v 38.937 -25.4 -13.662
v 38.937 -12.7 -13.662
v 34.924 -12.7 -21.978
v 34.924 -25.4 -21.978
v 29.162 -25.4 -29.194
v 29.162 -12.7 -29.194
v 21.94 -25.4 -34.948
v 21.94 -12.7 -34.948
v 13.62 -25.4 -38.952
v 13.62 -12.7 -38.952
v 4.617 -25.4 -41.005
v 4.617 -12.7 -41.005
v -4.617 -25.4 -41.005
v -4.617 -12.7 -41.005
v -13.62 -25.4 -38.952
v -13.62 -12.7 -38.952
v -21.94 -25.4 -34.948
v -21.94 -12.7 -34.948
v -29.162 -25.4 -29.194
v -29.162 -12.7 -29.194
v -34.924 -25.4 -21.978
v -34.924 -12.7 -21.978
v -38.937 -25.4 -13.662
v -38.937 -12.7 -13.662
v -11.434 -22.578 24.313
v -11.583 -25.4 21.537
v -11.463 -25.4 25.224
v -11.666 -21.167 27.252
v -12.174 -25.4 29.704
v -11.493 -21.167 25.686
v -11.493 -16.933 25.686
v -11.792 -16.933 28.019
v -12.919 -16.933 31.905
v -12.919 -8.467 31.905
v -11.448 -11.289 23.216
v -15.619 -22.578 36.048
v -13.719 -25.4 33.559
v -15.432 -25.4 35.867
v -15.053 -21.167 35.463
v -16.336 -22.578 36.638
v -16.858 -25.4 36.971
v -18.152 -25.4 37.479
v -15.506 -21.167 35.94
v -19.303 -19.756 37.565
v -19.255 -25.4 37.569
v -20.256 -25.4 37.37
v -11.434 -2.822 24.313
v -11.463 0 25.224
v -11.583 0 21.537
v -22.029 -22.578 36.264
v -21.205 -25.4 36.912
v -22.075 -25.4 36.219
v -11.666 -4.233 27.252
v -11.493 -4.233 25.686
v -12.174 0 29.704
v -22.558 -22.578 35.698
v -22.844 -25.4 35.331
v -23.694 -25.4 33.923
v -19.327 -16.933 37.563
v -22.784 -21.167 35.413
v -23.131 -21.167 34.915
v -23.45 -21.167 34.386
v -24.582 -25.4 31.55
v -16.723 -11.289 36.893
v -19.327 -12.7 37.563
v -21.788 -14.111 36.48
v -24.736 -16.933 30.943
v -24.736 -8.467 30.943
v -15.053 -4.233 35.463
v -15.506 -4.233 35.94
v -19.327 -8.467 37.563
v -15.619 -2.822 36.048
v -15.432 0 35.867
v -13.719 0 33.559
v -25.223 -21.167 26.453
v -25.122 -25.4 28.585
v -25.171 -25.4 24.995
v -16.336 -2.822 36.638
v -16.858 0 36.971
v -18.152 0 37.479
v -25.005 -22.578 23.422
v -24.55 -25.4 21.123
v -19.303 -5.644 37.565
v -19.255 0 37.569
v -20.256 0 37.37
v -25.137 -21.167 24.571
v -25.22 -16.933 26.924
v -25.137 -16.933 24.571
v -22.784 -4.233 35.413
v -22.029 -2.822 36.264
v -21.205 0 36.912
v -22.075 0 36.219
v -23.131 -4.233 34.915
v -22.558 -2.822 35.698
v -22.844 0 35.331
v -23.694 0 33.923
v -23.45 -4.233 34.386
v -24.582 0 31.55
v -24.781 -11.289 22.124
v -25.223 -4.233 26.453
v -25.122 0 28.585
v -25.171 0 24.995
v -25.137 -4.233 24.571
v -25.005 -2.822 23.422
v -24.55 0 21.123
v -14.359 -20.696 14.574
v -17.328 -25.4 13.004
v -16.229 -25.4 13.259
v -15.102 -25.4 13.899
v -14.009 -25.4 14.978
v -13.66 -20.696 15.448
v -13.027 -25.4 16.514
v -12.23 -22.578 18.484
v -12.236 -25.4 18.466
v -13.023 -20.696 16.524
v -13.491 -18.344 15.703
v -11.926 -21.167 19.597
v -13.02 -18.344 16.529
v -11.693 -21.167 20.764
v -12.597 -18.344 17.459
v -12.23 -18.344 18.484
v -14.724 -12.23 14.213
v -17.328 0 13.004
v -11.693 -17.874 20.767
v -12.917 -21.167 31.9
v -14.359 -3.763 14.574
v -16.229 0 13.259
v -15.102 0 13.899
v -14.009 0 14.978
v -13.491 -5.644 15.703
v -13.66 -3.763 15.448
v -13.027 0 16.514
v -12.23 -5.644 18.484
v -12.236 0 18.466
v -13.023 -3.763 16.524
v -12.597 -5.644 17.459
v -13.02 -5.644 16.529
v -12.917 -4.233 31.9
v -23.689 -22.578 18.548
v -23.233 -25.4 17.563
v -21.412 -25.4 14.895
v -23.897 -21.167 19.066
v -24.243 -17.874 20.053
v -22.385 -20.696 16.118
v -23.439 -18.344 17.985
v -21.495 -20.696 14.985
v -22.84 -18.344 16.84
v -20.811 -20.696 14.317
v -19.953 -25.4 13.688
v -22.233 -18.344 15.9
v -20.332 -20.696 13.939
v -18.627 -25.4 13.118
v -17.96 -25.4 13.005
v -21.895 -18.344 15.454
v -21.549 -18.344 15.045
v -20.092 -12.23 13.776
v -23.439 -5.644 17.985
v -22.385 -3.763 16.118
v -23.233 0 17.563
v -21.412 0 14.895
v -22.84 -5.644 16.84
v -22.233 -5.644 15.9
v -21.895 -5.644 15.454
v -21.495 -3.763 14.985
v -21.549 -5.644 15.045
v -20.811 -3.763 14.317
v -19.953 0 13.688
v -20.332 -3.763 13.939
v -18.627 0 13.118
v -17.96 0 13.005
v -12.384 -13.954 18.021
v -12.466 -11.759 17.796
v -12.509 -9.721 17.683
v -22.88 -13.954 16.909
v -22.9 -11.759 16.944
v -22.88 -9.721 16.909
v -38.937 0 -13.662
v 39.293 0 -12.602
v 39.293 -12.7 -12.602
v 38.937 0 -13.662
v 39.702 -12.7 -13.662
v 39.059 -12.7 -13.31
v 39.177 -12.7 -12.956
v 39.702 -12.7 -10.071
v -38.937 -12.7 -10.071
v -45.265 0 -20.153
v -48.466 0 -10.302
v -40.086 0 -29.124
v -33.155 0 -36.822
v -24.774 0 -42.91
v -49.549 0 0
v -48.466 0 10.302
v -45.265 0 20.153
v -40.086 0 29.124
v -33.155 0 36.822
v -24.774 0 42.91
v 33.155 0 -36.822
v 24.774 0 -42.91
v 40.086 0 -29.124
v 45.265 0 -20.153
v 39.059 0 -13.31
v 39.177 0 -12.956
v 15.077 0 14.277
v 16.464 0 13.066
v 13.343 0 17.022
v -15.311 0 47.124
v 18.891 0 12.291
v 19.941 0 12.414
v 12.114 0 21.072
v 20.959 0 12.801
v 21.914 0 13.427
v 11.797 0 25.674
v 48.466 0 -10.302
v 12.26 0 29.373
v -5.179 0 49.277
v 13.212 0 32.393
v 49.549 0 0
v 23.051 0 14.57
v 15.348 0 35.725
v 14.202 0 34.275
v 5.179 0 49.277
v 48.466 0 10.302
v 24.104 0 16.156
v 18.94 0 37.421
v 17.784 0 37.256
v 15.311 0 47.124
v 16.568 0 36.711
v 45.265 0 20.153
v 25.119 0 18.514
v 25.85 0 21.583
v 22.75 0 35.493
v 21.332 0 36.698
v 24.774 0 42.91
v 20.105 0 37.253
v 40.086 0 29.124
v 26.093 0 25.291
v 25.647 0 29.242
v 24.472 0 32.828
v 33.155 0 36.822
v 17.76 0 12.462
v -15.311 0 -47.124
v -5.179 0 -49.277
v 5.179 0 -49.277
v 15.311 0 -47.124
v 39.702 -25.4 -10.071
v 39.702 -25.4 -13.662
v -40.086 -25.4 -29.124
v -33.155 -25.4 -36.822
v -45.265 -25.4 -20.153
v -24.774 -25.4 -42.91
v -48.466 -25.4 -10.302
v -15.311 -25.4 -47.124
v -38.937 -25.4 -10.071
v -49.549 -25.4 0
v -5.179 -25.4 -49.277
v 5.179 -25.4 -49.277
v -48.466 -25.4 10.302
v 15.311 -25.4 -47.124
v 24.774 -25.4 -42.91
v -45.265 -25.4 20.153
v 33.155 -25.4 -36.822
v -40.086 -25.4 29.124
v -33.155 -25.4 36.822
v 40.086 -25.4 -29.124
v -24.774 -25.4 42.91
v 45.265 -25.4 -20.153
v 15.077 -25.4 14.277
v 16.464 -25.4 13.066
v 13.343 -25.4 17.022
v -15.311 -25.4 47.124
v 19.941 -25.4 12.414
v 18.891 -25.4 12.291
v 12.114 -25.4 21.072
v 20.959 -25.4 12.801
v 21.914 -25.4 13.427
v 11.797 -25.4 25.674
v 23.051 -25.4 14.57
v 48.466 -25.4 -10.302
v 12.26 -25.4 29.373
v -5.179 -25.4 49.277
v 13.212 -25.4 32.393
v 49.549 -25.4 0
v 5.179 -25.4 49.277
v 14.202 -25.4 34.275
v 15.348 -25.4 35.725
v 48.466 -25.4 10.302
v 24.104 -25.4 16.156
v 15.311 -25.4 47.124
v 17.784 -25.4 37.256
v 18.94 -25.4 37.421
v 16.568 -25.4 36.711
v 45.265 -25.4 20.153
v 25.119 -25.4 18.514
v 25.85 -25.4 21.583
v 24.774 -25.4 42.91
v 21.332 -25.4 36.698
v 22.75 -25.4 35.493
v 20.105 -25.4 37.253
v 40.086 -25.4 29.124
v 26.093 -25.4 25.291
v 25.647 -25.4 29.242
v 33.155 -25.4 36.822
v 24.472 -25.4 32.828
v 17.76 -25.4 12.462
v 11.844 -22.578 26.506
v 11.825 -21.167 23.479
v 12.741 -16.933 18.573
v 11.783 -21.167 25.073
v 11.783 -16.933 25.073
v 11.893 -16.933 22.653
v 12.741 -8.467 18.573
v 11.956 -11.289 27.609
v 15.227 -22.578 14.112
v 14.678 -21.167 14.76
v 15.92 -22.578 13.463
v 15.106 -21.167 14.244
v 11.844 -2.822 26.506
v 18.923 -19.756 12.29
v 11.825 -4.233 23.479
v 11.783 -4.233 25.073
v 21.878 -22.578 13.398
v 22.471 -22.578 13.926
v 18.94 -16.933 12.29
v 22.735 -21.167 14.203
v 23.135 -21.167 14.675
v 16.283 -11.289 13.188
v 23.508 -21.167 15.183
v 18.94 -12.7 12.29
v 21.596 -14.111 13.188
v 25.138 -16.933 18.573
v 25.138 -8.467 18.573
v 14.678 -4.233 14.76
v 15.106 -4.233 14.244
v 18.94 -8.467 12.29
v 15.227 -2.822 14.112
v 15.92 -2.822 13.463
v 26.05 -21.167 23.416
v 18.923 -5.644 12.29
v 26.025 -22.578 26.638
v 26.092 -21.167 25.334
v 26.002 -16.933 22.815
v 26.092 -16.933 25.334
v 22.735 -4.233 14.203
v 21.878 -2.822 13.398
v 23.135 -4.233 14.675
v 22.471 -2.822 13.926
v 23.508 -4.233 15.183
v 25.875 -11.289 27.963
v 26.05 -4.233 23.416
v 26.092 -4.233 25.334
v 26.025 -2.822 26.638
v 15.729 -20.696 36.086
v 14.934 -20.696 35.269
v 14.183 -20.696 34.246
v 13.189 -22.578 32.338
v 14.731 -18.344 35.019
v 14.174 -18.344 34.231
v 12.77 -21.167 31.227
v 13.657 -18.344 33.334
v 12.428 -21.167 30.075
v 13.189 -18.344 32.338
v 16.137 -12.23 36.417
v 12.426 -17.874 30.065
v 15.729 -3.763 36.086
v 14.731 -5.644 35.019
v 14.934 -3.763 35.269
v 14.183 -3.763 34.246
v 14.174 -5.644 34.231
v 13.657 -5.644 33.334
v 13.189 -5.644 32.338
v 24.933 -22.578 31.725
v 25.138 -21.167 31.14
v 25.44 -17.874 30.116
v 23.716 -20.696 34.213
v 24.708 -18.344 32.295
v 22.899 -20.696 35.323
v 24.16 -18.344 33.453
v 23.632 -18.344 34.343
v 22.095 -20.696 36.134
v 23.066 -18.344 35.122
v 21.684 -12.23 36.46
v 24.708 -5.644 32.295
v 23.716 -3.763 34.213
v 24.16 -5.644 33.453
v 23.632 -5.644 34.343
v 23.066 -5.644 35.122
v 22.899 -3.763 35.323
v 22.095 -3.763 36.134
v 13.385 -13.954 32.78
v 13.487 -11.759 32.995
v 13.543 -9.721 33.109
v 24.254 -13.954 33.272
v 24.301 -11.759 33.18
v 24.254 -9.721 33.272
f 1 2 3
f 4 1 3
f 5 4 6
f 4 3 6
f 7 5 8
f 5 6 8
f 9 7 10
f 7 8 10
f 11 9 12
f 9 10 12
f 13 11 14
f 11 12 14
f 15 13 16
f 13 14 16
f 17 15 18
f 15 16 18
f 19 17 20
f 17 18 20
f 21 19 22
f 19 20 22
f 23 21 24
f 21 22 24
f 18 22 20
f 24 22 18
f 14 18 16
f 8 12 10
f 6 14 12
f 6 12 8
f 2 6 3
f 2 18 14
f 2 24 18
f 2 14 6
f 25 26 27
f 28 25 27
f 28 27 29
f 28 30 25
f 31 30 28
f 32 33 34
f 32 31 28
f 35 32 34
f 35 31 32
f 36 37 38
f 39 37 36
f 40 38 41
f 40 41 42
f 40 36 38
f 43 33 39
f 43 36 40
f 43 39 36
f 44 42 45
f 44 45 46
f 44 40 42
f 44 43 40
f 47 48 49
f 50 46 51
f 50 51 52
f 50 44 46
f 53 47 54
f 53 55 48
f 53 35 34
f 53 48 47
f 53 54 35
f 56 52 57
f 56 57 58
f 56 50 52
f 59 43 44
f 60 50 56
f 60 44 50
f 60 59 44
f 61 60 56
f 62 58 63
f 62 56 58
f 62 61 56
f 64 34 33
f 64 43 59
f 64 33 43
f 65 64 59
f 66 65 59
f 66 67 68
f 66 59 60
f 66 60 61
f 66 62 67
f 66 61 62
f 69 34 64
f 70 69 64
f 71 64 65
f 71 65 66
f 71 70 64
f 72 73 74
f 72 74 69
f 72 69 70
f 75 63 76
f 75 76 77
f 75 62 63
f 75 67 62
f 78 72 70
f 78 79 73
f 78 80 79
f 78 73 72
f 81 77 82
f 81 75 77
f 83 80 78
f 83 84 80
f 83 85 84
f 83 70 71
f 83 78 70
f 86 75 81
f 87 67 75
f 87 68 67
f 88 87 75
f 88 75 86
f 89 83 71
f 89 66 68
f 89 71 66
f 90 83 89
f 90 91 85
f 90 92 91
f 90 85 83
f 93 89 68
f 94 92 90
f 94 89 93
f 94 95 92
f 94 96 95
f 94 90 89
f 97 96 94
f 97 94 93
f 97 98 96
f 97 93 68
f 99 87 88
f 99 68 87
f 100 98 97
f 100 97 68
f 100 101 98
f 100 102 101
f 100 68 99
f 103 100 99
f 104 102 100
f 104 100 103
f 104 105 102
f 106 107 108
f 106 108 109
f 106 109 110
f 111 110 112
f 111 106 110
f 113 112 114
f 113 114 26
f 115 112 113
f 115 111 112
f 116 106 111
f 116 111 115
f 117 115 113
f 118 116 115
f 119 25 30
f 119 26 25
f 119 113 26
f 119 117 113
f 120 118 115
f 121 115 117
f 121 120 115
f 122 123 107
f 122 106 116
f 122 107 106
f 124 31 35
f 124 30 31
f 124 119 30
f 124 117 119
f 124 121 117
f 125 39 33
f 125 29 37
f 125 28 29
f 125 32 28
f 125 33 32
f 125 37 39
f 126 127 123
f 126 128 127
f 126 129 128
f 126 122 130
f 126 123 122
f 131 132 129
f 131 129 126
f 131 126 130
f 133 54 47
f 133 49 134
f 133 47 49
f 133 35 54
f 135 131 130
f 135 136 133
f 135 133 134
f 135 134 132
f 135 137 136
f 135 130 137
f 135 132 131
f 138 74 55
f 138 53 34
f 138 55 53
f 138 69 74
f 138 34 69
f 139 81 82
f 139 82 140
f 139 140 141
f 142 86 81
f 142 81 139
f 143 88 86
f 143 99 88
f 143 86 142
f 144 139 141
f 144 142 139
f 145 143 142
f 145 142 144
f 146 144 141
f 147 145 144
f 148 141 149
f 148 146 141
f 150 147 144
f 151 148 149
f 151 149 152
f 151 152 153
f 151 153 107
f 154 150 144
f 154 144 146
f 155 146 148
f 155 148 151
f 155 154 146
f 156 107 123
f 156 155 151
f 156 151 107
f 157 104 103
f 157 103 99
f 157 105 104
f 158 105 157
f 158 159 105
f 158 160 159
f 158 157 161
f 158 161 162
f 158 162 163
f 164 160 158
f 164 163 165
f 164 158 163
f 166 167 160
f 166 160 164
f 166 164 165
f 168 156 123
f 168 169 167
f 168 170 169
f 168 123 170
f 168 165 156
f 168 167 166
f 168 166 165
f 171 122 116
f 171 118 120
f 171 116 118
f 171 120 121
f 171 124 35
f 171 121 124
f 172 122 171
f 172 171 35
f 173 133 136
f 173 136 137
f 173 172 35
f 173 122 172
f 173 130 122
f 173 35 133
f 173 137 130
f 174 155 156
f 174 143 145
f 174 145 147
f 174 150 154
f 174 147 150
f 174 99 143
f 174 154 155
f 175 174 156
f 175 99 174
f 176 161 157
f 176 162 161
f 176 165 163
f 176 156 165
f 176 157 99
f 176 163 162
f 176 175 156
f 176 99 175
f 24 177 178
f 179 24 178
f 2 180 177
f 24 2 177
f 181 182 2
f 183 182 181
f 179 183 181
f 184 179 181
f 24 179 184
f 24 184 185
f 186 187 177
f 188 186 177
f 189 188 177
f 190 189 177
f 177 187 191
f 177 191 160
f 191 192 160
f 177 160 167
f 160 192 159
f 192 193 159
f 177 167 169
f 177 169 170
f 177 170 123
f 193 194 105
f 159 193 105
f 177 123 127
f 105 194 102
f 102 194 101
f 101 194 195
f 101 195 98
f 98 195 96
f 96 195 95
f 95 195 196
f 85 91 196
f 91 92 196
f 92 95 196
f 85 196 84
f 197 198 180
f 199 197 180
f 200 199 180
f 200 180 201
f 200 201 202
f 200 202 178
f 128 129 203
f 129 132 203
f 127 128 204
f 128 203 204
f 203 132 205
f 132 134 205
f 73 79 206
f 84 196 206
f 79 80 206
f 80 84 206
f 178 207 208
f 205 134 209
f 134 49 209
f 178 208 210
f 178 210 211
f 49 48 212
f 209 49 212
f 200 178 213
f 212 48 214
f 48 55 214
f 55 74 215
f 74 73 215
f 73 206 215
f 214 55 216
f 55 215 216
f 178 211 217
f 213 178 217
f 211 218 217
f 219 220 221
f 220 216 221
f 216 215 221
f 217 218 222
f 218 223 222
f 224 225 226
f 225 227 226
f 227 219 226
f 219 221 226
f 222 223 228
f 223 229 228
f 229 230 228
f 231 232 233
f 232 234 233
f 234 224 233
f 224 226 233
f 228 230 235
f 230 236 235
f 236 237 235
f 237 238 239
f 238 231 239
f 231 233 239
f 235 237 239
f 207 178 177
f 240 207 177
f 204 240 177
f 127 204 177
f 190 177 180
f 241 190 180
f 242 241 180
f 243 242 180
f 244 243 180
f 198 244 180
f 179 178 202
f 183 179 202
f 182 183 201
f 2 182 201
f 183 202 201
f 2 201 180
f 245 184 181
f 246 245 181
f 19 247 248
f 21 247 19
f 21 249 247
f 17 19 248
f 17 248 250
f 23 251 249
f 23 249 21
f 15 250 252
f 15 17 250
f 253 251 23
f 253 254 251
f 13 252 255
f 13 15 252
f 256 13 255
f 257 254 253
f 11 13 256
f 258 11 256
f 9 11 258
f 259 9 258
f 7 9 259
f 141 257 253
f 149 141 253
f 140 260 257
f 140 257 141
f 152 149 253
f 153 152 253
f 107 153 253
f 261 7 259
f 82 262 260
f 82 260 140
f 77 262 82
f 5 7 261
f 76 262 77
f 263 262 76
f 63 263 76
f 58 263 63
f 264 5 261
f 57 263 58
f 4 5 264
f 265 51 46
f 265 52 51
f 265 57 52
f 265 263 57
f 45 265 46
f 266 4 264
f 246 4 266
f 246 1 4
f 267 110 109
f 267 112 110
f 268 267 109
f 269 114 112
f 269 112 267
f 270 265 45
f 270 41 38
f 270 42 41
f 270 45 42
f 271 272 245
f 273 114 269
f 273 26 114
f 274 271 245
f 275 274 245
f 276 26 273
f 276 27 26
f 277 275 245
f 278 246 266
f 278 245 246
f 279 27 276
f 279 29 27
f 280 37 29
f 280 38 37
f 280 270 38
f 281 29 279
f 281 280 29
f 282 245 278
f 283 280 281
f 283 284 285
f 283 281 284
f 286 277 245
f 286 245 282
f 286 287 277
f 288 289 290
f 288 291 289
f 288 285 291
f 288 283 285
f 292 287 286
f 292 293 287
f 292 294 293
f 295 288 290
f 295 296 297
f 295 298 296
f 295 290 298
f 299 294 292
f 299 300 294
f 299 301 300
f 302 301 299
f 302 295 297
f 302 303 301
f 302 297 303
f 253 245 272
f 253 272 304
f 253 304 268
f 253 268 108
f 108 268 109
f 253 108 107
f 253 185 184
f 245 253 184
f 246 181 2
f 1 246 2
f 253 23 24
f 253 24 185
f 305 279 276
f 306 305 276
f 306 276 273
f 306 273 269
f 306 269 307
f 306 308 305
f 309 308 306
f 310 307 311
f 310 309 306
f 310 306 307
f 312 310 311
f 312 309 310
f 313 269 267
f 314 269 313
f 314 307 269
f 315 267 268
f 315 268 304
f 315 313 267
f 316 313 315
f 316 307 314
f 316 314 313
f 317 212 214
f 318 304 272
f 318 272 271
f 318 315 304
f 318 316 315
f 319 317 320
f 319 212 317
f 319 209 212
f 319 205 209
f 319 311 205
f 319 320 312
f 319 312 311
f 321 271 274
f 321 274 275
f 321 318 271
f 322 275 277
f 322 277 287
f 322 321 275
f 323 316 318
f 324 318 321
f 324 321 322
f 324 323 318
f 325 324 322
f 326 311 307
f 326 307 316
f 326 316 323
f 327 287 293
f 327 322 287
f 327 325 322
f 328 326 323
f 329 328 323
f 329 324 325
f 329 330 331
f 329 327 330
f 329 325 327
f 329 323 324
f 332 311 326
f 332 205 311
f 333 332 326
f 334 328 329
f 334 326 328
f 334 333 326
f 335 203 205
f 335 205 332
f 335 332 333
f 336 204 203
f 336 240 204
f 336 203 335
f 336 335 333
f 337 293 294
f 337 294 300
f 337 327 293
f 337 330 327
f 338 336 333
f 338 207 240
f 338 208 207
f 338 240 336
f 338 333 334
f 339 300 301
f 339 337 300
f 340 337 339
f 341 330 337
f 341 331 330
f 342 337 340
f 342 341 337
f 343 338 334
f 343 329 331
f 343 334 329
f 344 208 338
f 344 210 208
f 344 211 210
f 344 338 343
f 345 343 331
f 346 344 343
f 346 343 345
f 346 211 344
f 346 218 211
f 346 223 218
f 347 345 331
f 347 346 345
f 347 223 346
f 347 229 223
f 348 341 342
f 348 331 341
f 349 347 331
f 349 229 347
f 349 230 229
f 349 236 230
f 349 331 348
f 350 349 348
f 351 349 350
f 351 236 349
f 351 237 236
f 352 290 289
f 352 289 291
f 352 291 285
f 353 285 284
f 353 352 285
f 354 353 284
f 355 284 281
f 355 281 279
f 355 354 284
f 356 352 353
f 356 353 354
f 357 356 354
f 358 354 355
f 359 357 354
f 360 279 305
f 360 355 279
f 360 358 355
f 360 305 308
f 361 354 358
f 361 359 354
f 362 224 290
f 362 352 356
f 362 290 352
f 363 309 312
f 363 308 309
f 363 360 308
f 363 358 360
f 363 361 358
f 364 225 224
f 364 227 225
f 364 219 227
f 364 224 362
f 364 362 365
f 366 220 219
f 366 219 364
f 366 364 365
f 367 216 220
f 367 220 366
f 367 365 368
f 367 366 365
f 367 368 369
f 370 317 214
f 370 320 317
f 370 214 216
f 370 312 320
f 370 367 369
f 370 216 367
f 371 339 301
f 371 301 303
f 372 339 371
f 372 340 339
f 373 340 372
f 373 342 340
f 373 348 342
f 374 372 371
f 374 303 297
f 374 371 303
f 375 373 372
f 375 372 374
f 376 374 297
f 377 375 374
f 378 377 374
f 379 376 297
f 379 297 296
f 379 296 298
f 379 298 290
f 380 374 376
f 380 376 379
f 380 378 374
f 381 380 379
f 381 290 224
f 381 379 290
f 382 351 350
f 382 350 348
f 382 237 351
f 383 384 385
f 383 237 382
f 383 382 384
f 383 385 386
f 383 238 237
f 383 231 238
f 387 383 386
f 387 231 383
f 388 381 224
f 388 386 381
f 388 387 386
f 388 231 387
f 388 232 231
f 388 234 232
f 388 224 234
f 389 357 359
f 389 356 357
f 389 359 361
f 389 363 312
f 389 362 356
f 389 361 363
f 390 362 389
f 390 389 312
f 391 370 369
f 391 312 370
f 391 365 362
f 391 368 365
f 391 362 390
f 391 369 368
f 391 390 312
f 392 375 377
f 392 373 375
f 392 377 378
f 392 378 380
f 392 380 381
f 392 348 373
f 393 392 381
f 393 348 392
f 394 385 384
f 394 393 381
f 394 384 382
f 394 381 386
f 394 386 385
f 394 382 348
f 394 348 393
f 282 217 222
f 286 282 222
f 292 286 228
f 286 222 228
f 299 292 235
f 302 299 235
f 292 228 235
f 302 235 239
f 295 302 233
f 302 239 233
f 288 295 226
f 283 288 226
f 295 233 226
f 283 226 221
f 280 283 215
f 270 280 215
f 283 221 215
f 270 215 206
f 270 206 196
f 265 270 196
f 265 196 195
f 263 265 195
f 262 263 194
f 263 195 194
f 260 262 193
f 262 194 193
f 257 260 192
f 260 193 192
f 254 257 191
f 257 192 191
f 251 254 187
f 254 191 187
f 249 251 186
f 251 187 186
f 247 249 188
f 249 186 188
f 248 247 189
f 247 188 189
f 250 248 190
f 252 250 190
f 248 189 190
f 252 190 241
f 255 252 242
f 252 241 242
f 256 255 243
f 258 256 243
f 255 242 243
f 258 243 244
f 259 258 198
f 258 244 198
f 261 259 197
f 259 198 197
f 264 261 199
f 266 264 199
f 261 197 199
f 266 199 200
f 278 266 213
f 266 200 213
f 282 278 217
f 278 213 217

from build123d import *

# Parameters (mm, degrees)
F0_R     = 49.5487095178
F1_DEPTH = 25.4
F2_DEPTH = 12.7
F3_DEPTH = 12.7


with BuildPart() as f1:
    # F0 (on Front) → F1 (new body)
    with BuildSketch(Plane.XZ):
        Circle(F0_R)
        with BuildLine():
            Line((39.7017709911, -13.6615851751), (38.9369094103, -13.6615851751))
            ThreePointArc((38.9369094103, -13.6615851751), (0, -41.2640500184), (-38.9369094103, -13.6615851751))
            Line((-38.9369094103, -13.6615851751), (-38.9369094103, -10.0709088147))
            Line((-38.9369094103, -10.0709088147), (39.7017709911, -10.0709088147))
            Line((39.7017709911, -10.0709088147), (39.7017709911, -13.6615851751))
        make_face(mode=Mode.SUBTRACT)
        with BuildLine():
            add(Edge.make_bspline(
                [(-17.3281822354, 13.0042480305), (-5.5105900176, 13.9661418094), (-12.918637589, 31.904632496), (-20.3266851604, 49.8431231827), (-24.7362298067, 30.9427387171), (-29.1457744531, 12.0423542516), (-17.3281822354, 13.0042480305)],
                knots=[0, 0, 0, 2.0943951024, 2.0943951024, 4.1887902048, 4.1887902048, 6.2831853072, 6.2831853072, 6.2831853072], degree=2, weights=[1, 0.5, 1, 0.5, 1, 0.5, 1]))
        make_face(mode=Mode.SUBTRACT)
        with BuildLine():
            add(Edge.make_bspline(
                [(18.9395453781, 37.4207124114), (6.5418776512, 37.4207124114), (12.7407115146, 18.5729134828), (18.9395453781, -0.2748854458), (25.1383792415, 18.5729134828), (31.337213105, 37.4207124114), (18.9395453781, 37.4207124114)],
                knots=[0, 0, 0, 2.0943951024, 2.0943951024, 4.1887902048, 4.1887902048, 6.2831853072, 6.2831853072, 6.2831853072], degree=2, weights=[1, 0.5, 1, 0.5, 1, 0.5, 1]))
        make_face(mode=Mode.SUBTRACT)
    extrude(amount=F1_DEPTH)

    # F0 (on Front) → F2 (join)
    with BuildSketch(Plane.XZ):
        with BuildLine():
            ThreePointArc((-38.9369094103, -13.6615851751), (0, -41.2640500184), (38.9369094103, -13.6615851751))
            Line((38.9369094103, -13.6615851751), (-38.9369094103, -13.6615851751))
        make_face()
    extrude(amount=F2_DEPTH)

    # F0 (on Front) → F3 (join)
    with BuildSketch(Plane.XZ):
        with BuildLine():
            Line((-38.9369094103, -13.6615851751), (39.2926037312, -12.6021075994))
            ThreePointArc((39.2926037312, -12.6021075994), (39.1183435842, -13.1330506414), (38.9369094103, -13.6615851751))
            Line((38.9369094103, -13.6615851751), (39.7017709911, -13.6615851751))
            Line((39.7017709911, -13.6615851751), (39.7017709911, -10.0709088147))
            Line((39.7017709911, -10.0709088147), (-38.9369094103, -10.0709088147))
            Line((-38.9369094103, -10.0709088147), (-38.9369094103, -13.6615851751))
        make_face()
    extrude(amount=F3_DEPTH)


solid = f1.part
